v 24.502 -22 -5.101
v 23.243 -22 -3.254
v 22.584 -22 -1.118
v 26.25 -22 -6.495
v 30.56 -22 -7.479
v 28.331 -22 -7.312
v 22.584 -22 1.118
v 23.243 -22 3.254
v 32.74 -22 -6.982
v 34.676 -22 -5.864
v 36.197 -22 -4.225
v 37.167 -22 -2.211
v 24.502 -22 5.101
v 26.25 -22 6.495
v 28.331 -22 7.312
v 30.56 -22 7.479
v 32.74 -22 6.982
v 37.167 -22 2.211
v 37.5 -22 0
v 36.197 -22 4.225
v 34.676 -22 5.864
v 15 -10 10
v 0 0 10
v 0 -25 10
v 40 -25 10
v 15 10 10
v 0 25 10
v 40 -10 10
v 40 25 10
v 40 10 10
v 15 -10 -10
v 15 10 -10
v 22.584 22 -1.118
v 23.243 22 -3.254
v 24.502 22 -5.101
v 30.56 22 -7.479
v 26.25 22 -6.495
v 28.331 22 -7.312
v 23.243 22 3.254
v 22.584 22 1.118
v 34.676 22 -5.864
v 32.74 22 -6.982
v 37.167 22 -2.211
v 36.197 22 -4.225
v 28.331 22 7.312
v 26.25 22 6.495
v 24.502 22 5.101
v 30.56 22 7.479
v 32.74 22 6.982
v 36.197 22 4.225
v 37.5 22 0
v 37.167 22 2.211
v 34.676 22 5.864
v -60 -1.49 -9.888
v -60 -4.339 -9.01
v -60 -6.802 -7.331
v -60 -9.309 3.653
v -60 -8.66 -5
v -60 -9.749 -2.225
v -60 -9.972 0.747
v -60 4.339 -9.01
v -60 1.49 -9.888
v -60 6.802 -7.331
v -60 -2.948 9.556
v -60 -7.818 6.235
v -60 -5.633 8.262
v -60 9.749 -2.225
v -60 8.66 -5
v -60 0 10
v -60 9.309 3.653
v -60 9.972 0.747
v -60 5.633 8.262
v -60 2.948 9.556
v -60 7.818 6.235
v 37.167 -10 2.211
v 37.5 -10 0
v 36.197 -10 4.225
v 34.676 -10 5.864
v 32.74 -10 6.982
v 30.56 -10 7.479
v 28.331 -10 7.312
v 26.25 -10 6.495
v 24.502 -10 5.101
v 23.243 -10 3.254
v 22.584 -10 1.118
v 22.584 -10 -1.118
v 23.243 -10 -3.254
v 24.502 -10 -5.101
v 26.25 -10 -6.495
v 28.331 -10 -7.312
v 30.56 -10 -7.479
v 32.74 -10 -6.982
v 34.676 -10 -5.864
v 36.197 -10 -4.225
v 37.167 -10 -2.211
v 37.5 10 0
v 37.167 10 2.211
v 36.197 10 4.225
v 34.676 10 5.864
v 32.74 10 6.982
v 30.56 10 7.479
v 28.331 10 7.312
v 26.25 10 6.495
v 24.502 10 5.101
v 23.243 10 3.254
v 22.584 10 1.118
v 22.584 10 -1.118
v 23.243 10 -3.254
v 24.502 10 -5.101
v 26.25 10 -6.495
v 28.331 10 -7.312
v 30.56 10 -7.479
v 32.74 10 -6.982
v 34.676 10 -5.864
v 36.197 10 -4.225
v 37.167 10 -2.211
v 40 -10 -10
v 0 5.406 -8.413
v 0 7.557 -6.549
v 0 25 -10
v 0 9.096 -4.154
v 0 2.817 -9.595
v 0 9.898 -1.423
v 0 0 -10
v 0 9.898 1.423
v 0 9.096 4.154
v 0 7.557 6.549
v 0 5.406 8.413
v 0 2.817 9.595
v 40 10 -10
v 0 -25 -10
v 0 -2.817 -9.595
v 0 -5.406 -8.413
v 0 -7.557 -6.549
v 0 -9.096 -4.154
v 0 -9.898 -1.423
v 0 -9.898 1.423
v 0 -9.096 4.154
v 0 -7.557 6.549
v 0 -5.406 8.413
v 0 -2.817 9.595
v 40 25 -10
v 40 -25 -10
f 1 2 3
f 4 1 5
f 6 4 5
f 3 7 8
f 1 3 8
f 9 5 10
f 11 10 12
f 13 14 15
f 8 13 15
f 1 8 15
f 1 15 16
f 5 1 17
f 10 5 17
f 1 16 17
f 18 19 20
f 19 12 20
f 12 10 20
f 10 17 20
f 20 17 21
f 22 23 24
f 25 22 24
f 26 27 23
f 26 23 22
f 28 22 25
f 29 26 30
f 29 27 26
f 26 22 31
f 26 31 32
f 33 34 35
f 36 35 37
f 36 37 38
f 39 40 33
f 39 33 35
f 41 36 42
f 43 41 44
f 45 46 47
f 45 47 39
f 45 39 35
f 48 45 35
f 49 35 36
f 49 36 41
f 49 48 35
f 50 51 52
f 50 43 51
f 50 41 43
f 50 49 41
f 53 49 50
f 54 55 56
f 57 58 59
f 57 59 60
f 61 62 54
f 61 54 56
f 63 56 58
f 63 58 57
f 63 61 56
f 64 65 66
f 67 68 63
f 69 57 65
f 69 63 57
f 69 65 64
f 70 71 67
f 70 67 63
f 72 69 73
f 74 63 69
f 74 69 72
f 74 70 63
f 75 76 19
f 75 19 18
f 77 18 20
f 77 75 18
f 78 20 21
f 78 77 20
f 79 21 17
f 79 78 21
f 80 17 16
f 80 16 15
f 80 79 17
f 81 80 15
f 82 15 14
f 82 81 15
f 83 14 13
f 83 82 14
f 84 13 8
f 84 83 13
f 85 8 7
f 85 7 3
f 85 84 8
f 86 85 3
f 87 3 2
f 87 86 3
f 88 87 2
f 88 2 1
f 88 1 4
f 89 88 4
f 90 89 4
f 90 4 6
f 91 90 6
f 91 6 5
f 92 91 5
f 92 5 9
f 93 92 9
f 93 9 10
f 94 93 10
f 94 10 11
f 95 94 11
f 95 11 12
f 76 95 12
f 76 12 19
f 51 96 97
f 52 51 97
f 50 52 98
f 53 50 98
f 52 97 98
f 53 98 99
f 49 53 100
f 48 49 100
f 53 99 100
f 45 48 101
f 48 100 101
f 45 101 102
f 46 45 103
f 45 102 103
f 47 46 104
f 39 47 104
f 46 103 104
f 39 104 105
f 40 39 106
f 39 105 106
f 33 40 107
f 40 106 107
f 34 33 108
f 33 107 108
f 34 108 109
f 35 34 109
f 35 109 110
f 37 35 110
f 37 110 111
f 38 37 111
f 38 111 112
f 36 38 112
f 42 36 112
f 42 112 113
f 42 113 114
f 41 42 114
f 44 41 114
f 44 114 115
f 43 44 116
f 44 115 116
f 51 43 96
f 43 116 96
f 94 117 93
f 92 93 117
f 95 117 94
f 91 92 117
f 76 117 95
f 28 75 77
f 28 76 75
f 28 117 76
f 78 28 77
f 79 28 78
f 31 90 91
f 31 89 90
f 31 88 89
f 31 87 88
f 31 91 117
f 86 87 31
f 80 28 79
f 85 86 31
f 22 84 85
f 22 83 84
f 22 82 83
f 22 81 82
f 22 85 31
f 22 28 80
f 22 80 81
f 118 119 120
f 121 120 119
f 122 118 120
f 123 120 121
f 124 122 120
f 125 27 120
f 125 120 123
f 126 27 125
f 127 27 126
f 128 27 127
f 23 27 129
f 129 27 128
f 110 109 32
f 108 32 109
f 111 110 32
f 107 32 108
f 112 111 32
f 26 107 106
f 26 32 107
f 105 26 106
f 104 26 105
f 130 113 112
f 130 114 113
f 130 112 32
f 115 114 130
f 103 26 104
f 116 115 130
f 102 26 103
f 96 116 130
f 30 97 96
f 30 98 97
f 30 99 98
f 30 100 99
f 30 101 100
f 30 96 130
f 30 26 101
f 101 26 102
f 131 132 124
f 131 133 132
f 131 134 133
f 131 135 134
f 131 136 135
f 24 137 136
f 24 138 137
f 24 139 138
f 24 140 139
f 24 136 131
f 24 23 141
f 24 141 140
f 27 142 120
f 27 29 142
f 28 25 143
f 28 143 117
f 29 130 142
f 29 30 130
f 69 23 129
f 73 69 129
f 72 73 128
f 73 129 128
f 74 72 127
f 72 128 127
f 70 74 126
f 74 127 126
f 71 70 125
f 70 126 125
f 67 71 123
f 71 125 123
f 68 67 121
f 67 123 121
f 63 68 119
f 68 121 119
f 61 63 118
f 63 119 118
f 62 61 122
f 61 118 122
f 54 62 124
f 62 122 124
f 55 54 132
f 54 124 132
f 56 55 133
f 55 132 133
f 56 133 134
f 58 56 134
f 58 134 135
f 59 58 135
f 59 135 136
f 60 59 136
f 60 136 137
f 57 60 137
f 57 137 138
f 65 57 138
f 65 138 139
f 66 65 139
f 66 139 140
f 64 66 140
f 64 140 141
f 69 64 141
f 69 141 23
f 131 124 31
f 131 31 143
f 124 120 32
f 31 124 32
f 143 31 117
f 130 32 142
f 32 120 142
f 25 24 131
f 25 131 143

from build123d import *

# Parameters (mm, degrees)
BOSS_EXTRUDE1_DEPTH     = 10
SKETCH3_R               = 10
BOSS_EXTRUDE2_DEPTH     = 60
SKETCH4_R               = 7.5
CUT_EXTRUDE1_DEPTH      = 32
CUT_EXTRUDE1_DEPTH_BACK = 12


with BuildPart() as part:
    # Sketch2 → Boss-Extrude1 (new body, symmetric)
    with BuildSketch(Plane.XY):
        Polygon((0, 25), (0, -25), (40, -25), (40, -10), (15, -10), (15, 10), (40, 10), (40, 25), align=None)
    extrude(amount=BOSS_EXTRUDE1_DEPTH, both=True)

    # Sketch3 → Boss-Extrude2 (add)
    with BuildSketch(Plane.ZY):
        Circle(SKETCH3_R)
    extrude(amount=BOSS_EXTRUDE2_DEPTH)

    # Sketch4 → Cut-Extrude1 (cut, two sides)
    with BuildSketch(Plane.XZ.offset(-10)) as cut_extrude1_sk:
        with Locations((30, 0)):
            Circle(SKETCH4_R)
    extrude(amount=CUT_EXTRUDE1_DEPTH, mode=Mode.SUBTRACT)
    extrude(cut_extrude1_sk.sketch, amount=-CUT_EXTRUDE1_DEPTH_BACK, mode=Mode.SUBTRACT)


solid = part.part
